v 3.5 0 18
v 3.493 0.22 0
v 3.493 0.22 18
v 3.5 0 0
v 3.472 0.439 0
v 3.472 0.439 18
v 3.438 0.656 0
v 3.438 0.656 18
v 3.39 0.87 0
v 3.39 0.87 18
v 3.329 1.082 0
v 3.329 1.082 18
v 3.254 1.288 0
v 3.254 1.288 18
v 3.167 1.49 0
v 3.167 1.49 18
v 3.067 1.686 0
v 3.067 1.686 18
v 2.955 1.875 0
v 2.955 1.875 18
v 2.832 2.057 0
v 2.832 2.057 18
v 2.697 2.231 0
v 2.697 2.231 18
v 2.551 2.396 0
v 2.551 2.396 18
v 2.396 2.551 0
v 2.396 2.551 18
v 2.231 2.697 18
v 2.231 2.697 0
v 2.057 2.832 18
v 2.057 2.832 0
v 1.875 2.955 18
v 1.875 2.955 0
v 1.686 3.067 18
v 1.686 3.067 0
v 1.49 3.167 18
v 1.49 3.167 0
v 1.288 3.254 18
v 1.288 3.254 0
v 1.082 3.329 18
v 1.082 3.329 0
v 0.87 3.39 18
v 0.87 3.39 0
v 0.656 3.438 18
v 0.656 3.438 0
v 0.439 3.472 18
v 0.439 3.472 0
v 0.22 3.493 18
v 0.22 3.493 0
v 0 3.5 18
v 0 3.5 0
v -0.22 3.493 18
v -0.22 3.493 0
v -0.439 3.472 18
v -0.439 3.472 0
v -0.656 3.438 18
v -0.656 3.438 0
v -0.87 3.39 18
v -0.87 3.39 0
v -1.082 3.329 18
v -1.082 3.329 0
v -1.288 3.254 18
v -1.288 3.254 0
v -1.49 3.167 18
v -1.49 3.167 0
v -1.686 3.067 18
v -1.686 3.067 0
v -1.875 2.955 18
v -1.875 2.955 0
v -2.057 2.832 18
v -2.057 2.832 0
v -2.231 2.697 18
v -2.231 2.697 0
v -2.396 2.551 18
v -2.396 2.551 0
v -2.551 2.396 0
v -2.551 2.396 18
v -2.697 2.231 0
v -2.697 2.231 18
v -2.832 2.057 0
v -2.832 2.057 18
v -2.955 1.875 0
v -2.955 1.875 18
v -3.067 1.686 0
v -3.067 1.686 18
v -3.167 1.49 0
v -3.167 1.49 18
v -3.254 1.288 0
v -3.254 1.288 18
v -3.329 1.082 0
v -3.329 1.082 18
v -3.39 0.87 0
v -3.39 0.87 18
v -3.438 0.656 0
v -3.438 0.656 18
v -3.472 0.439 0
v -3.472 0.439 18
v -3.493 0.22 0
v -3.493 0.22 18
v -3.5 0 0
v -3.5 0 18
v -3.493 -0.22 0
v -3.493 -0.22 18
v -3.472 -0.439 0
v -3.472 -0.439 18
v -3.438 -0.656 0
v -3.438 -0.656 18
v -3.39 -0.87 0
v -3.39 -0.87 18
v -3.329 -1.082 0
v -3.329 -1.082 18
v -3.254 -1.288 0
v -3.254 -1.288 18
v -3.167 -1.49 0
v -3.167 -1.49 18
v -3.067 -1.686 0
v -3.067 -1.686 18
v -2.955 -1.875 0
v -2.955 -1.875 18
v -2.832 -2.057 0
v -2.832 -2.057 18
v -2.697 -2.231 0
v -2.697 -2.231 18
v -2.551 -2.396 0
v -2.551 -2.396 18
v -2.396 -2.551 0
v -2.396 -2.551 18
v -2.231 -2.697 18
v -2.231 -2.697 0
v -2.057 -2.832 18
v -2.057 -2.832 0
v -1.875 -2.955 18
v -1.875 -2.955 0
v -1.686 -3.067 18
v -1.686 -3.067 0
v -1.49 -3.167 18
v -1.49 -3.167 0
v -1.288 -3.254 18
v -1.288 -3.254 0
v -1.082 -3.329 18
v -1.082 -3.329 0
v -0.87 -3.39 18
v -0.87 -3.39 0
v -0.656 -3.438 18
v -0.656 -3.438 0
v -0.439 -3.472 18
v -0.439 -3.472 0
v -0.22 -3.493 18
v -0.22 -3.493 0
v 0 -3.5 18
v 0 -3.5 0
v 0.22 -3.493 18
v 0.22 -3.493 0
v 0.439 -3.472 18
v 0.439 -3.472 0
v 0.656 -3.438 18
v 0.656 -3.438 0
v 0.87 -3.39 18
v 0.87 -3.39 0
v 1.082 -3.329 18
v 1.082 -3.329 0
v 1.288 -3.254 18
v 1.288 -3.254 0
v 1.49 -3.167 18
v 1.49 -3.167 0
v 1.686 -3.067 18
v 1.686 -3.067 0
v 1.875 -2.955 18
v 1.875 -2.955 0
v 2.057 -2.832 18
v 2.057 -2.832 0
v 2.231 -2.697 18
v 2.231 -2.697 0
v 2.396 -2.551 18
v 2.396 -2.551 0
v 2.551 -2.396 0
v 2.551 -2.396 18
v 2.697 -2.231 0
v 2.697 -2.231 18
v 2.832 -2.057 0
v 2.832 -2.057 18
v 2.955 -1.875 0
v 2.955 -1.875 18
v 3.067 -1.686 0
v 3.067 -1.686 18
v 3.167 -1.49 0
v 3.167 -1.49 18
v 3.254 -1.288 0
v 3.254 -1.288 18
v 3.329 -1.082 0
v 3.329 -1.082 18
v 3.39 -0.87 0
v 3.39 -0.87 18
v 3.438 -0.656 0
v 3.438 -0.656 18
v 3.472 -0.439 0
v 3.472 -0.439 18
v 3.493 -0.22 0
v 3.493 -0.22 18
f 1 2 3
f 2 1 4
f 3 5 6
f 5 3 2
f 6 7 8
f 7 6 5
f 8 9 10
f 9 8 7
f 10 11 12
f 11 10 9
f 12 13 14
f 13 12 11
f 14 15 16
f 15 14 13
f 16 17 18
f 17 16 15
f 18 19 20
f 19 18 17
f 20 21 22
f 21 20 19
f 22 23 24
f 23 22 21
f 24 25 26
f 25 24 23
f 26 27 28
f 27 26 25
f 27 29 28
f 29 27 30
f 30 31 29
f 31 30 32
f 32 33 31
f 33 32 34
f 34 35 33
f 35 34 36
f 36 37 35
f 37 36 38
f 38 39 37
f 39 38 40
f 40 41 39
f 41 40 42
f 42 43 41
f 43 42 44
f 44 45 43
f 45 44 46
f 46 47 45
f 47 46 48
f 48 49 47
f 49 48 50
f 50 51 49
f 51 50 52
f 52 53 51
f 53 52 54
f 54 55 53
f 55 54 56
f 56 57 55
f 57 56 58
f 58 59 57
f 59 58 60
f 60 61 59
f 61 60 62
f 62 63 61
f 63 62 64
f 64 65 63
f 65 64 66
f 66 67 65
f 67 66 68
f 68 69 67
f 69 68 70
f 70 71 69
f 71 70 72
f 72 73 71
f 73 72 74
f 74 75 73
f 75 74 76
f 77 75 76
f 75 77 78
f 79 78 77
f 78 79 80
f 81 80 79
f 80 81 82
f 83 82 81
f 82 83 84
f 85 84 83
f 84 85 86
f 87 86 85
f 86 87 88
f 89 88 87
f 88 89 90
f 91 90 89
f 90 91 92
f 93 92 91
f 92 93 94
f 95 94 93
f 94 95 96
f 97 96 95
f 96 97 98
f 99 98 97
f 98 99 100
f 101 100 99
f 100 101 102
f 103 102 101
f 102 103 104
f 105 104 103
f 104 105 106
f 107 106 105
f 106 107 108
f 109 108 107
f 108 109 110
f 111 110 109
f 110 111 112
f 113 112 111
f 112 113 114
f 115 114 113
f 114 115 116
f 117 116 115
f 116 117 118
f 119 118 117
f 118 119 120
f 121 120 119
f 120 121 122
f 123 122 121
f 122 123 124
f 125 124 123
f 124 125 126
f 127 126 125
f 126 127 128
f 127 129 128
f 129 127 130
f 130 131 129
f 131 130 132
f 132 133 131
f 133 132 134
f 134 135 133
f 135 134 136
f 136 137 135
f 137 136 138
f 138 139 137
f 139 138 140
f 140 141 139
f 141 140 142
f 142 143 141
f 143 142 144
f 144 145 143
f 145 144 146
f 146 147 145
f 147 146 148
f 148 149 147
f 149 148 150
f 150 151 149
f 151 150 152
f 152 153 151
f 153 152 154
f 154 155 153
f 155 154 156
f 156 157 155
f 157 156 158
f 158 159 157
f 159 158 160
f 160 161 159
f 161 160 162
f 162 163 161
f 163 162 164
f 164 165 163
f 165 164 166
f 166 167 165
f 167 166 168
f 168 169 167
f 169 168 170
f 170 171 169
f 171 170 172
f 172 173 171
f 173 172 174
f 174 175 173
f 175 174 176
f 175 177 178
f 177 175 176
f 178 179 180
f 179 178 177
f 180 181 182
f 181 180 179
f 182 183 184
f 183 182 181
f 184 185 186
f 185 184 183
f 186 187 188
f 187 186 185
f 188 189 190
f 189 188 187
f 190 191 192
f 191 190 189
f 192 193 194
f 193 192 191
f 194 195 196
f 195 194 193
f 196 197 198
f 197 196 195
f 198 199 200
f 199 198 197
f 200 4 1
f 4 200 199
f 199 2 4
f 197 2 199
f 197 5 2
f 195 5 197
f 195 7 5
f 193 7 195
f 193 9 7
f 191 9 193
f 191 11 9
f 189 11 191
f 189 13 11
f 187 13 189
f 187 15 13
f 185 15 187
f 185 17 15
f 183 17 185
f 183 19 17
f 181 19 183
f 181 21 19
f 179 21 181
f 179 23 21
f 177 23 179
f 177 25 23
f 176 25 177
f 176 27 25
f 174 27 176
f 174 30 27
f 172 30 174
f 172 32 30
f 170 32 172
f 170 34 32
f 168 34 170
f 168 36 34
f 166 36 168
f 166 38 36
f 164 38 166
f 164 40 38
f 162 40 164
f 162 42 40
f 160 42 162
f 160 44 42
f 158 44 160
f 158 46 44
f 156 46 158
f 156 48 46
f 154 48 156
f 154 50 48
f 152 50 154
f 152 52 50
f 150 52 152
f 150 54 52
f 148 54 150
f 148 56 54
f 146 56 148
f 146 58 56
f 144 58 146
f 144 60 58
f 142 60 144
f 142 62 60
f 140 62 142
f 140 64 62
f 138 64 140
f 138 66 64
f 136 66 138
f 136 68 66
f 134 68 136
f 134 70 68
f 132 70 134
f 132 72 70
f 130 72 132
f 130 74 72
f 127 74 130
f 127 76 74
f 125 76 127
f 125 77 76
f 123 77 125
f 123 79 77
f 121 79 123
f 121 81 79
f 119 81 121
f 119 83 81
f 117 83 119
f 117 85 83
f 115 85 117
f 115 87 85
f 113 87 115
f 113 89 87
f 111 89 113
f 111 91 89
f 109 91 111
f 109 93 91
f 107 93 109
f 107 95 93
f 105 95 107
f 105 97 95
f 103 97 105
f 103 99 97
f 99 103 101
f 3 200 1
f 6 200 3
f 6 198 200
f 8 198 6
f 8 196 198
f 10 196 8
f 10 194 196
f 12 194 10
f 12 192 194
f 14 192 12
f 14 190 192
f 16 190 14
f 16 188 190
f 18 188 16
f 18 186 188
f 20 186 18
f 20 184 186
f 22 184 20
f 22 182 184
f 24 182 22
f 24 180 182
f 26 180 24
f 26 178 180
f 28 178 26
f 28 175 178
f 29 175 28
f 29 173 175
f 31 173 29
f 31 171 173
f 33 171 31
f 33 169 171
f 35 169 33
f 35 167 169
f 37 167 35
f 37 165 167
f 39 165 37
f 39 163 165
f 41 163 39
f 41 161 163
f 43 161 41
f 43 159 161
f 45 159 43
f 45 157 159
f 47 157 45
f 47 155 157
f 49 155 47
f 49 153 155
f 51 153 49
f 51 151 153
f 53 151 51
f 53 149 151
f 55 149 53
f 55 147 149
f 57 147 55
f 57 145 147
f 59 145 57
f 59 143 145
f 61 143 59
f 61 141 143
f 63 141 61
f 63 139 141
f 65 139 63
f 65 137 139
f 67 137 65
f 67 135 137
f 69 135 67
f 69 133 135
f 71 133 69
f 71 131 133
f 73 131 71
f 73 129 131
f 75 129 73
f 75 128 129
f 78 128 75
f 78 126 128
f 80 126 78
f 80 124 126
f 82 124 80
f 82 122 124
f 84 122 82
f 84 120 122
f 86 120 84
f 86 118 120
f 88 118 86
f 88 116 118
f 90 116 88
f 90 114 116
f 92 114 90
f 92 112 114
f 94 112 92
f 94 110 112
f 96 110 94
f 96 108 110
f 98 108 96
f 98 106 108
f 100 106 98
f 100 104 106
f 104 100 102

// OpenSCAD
$fn=100;

module body()
{
  cube([45, 10, 26], false);

  translate([0,10,16])
    cube([45, 24, 10], false);

   difference() 
  {

  translate([0,24,-24])
    cube([45, 10, 50], false);


  translate([10,40,-12])
    rotate([100,0,0])
      cylinder(h=20,r=4);

  translate([35,40,-12])
    rotate([100,0,0])
      cylinder(h=20,r=4);

  }
}

module shaft()
{
  cylinder(h=18,d=7);
}

shaft();
